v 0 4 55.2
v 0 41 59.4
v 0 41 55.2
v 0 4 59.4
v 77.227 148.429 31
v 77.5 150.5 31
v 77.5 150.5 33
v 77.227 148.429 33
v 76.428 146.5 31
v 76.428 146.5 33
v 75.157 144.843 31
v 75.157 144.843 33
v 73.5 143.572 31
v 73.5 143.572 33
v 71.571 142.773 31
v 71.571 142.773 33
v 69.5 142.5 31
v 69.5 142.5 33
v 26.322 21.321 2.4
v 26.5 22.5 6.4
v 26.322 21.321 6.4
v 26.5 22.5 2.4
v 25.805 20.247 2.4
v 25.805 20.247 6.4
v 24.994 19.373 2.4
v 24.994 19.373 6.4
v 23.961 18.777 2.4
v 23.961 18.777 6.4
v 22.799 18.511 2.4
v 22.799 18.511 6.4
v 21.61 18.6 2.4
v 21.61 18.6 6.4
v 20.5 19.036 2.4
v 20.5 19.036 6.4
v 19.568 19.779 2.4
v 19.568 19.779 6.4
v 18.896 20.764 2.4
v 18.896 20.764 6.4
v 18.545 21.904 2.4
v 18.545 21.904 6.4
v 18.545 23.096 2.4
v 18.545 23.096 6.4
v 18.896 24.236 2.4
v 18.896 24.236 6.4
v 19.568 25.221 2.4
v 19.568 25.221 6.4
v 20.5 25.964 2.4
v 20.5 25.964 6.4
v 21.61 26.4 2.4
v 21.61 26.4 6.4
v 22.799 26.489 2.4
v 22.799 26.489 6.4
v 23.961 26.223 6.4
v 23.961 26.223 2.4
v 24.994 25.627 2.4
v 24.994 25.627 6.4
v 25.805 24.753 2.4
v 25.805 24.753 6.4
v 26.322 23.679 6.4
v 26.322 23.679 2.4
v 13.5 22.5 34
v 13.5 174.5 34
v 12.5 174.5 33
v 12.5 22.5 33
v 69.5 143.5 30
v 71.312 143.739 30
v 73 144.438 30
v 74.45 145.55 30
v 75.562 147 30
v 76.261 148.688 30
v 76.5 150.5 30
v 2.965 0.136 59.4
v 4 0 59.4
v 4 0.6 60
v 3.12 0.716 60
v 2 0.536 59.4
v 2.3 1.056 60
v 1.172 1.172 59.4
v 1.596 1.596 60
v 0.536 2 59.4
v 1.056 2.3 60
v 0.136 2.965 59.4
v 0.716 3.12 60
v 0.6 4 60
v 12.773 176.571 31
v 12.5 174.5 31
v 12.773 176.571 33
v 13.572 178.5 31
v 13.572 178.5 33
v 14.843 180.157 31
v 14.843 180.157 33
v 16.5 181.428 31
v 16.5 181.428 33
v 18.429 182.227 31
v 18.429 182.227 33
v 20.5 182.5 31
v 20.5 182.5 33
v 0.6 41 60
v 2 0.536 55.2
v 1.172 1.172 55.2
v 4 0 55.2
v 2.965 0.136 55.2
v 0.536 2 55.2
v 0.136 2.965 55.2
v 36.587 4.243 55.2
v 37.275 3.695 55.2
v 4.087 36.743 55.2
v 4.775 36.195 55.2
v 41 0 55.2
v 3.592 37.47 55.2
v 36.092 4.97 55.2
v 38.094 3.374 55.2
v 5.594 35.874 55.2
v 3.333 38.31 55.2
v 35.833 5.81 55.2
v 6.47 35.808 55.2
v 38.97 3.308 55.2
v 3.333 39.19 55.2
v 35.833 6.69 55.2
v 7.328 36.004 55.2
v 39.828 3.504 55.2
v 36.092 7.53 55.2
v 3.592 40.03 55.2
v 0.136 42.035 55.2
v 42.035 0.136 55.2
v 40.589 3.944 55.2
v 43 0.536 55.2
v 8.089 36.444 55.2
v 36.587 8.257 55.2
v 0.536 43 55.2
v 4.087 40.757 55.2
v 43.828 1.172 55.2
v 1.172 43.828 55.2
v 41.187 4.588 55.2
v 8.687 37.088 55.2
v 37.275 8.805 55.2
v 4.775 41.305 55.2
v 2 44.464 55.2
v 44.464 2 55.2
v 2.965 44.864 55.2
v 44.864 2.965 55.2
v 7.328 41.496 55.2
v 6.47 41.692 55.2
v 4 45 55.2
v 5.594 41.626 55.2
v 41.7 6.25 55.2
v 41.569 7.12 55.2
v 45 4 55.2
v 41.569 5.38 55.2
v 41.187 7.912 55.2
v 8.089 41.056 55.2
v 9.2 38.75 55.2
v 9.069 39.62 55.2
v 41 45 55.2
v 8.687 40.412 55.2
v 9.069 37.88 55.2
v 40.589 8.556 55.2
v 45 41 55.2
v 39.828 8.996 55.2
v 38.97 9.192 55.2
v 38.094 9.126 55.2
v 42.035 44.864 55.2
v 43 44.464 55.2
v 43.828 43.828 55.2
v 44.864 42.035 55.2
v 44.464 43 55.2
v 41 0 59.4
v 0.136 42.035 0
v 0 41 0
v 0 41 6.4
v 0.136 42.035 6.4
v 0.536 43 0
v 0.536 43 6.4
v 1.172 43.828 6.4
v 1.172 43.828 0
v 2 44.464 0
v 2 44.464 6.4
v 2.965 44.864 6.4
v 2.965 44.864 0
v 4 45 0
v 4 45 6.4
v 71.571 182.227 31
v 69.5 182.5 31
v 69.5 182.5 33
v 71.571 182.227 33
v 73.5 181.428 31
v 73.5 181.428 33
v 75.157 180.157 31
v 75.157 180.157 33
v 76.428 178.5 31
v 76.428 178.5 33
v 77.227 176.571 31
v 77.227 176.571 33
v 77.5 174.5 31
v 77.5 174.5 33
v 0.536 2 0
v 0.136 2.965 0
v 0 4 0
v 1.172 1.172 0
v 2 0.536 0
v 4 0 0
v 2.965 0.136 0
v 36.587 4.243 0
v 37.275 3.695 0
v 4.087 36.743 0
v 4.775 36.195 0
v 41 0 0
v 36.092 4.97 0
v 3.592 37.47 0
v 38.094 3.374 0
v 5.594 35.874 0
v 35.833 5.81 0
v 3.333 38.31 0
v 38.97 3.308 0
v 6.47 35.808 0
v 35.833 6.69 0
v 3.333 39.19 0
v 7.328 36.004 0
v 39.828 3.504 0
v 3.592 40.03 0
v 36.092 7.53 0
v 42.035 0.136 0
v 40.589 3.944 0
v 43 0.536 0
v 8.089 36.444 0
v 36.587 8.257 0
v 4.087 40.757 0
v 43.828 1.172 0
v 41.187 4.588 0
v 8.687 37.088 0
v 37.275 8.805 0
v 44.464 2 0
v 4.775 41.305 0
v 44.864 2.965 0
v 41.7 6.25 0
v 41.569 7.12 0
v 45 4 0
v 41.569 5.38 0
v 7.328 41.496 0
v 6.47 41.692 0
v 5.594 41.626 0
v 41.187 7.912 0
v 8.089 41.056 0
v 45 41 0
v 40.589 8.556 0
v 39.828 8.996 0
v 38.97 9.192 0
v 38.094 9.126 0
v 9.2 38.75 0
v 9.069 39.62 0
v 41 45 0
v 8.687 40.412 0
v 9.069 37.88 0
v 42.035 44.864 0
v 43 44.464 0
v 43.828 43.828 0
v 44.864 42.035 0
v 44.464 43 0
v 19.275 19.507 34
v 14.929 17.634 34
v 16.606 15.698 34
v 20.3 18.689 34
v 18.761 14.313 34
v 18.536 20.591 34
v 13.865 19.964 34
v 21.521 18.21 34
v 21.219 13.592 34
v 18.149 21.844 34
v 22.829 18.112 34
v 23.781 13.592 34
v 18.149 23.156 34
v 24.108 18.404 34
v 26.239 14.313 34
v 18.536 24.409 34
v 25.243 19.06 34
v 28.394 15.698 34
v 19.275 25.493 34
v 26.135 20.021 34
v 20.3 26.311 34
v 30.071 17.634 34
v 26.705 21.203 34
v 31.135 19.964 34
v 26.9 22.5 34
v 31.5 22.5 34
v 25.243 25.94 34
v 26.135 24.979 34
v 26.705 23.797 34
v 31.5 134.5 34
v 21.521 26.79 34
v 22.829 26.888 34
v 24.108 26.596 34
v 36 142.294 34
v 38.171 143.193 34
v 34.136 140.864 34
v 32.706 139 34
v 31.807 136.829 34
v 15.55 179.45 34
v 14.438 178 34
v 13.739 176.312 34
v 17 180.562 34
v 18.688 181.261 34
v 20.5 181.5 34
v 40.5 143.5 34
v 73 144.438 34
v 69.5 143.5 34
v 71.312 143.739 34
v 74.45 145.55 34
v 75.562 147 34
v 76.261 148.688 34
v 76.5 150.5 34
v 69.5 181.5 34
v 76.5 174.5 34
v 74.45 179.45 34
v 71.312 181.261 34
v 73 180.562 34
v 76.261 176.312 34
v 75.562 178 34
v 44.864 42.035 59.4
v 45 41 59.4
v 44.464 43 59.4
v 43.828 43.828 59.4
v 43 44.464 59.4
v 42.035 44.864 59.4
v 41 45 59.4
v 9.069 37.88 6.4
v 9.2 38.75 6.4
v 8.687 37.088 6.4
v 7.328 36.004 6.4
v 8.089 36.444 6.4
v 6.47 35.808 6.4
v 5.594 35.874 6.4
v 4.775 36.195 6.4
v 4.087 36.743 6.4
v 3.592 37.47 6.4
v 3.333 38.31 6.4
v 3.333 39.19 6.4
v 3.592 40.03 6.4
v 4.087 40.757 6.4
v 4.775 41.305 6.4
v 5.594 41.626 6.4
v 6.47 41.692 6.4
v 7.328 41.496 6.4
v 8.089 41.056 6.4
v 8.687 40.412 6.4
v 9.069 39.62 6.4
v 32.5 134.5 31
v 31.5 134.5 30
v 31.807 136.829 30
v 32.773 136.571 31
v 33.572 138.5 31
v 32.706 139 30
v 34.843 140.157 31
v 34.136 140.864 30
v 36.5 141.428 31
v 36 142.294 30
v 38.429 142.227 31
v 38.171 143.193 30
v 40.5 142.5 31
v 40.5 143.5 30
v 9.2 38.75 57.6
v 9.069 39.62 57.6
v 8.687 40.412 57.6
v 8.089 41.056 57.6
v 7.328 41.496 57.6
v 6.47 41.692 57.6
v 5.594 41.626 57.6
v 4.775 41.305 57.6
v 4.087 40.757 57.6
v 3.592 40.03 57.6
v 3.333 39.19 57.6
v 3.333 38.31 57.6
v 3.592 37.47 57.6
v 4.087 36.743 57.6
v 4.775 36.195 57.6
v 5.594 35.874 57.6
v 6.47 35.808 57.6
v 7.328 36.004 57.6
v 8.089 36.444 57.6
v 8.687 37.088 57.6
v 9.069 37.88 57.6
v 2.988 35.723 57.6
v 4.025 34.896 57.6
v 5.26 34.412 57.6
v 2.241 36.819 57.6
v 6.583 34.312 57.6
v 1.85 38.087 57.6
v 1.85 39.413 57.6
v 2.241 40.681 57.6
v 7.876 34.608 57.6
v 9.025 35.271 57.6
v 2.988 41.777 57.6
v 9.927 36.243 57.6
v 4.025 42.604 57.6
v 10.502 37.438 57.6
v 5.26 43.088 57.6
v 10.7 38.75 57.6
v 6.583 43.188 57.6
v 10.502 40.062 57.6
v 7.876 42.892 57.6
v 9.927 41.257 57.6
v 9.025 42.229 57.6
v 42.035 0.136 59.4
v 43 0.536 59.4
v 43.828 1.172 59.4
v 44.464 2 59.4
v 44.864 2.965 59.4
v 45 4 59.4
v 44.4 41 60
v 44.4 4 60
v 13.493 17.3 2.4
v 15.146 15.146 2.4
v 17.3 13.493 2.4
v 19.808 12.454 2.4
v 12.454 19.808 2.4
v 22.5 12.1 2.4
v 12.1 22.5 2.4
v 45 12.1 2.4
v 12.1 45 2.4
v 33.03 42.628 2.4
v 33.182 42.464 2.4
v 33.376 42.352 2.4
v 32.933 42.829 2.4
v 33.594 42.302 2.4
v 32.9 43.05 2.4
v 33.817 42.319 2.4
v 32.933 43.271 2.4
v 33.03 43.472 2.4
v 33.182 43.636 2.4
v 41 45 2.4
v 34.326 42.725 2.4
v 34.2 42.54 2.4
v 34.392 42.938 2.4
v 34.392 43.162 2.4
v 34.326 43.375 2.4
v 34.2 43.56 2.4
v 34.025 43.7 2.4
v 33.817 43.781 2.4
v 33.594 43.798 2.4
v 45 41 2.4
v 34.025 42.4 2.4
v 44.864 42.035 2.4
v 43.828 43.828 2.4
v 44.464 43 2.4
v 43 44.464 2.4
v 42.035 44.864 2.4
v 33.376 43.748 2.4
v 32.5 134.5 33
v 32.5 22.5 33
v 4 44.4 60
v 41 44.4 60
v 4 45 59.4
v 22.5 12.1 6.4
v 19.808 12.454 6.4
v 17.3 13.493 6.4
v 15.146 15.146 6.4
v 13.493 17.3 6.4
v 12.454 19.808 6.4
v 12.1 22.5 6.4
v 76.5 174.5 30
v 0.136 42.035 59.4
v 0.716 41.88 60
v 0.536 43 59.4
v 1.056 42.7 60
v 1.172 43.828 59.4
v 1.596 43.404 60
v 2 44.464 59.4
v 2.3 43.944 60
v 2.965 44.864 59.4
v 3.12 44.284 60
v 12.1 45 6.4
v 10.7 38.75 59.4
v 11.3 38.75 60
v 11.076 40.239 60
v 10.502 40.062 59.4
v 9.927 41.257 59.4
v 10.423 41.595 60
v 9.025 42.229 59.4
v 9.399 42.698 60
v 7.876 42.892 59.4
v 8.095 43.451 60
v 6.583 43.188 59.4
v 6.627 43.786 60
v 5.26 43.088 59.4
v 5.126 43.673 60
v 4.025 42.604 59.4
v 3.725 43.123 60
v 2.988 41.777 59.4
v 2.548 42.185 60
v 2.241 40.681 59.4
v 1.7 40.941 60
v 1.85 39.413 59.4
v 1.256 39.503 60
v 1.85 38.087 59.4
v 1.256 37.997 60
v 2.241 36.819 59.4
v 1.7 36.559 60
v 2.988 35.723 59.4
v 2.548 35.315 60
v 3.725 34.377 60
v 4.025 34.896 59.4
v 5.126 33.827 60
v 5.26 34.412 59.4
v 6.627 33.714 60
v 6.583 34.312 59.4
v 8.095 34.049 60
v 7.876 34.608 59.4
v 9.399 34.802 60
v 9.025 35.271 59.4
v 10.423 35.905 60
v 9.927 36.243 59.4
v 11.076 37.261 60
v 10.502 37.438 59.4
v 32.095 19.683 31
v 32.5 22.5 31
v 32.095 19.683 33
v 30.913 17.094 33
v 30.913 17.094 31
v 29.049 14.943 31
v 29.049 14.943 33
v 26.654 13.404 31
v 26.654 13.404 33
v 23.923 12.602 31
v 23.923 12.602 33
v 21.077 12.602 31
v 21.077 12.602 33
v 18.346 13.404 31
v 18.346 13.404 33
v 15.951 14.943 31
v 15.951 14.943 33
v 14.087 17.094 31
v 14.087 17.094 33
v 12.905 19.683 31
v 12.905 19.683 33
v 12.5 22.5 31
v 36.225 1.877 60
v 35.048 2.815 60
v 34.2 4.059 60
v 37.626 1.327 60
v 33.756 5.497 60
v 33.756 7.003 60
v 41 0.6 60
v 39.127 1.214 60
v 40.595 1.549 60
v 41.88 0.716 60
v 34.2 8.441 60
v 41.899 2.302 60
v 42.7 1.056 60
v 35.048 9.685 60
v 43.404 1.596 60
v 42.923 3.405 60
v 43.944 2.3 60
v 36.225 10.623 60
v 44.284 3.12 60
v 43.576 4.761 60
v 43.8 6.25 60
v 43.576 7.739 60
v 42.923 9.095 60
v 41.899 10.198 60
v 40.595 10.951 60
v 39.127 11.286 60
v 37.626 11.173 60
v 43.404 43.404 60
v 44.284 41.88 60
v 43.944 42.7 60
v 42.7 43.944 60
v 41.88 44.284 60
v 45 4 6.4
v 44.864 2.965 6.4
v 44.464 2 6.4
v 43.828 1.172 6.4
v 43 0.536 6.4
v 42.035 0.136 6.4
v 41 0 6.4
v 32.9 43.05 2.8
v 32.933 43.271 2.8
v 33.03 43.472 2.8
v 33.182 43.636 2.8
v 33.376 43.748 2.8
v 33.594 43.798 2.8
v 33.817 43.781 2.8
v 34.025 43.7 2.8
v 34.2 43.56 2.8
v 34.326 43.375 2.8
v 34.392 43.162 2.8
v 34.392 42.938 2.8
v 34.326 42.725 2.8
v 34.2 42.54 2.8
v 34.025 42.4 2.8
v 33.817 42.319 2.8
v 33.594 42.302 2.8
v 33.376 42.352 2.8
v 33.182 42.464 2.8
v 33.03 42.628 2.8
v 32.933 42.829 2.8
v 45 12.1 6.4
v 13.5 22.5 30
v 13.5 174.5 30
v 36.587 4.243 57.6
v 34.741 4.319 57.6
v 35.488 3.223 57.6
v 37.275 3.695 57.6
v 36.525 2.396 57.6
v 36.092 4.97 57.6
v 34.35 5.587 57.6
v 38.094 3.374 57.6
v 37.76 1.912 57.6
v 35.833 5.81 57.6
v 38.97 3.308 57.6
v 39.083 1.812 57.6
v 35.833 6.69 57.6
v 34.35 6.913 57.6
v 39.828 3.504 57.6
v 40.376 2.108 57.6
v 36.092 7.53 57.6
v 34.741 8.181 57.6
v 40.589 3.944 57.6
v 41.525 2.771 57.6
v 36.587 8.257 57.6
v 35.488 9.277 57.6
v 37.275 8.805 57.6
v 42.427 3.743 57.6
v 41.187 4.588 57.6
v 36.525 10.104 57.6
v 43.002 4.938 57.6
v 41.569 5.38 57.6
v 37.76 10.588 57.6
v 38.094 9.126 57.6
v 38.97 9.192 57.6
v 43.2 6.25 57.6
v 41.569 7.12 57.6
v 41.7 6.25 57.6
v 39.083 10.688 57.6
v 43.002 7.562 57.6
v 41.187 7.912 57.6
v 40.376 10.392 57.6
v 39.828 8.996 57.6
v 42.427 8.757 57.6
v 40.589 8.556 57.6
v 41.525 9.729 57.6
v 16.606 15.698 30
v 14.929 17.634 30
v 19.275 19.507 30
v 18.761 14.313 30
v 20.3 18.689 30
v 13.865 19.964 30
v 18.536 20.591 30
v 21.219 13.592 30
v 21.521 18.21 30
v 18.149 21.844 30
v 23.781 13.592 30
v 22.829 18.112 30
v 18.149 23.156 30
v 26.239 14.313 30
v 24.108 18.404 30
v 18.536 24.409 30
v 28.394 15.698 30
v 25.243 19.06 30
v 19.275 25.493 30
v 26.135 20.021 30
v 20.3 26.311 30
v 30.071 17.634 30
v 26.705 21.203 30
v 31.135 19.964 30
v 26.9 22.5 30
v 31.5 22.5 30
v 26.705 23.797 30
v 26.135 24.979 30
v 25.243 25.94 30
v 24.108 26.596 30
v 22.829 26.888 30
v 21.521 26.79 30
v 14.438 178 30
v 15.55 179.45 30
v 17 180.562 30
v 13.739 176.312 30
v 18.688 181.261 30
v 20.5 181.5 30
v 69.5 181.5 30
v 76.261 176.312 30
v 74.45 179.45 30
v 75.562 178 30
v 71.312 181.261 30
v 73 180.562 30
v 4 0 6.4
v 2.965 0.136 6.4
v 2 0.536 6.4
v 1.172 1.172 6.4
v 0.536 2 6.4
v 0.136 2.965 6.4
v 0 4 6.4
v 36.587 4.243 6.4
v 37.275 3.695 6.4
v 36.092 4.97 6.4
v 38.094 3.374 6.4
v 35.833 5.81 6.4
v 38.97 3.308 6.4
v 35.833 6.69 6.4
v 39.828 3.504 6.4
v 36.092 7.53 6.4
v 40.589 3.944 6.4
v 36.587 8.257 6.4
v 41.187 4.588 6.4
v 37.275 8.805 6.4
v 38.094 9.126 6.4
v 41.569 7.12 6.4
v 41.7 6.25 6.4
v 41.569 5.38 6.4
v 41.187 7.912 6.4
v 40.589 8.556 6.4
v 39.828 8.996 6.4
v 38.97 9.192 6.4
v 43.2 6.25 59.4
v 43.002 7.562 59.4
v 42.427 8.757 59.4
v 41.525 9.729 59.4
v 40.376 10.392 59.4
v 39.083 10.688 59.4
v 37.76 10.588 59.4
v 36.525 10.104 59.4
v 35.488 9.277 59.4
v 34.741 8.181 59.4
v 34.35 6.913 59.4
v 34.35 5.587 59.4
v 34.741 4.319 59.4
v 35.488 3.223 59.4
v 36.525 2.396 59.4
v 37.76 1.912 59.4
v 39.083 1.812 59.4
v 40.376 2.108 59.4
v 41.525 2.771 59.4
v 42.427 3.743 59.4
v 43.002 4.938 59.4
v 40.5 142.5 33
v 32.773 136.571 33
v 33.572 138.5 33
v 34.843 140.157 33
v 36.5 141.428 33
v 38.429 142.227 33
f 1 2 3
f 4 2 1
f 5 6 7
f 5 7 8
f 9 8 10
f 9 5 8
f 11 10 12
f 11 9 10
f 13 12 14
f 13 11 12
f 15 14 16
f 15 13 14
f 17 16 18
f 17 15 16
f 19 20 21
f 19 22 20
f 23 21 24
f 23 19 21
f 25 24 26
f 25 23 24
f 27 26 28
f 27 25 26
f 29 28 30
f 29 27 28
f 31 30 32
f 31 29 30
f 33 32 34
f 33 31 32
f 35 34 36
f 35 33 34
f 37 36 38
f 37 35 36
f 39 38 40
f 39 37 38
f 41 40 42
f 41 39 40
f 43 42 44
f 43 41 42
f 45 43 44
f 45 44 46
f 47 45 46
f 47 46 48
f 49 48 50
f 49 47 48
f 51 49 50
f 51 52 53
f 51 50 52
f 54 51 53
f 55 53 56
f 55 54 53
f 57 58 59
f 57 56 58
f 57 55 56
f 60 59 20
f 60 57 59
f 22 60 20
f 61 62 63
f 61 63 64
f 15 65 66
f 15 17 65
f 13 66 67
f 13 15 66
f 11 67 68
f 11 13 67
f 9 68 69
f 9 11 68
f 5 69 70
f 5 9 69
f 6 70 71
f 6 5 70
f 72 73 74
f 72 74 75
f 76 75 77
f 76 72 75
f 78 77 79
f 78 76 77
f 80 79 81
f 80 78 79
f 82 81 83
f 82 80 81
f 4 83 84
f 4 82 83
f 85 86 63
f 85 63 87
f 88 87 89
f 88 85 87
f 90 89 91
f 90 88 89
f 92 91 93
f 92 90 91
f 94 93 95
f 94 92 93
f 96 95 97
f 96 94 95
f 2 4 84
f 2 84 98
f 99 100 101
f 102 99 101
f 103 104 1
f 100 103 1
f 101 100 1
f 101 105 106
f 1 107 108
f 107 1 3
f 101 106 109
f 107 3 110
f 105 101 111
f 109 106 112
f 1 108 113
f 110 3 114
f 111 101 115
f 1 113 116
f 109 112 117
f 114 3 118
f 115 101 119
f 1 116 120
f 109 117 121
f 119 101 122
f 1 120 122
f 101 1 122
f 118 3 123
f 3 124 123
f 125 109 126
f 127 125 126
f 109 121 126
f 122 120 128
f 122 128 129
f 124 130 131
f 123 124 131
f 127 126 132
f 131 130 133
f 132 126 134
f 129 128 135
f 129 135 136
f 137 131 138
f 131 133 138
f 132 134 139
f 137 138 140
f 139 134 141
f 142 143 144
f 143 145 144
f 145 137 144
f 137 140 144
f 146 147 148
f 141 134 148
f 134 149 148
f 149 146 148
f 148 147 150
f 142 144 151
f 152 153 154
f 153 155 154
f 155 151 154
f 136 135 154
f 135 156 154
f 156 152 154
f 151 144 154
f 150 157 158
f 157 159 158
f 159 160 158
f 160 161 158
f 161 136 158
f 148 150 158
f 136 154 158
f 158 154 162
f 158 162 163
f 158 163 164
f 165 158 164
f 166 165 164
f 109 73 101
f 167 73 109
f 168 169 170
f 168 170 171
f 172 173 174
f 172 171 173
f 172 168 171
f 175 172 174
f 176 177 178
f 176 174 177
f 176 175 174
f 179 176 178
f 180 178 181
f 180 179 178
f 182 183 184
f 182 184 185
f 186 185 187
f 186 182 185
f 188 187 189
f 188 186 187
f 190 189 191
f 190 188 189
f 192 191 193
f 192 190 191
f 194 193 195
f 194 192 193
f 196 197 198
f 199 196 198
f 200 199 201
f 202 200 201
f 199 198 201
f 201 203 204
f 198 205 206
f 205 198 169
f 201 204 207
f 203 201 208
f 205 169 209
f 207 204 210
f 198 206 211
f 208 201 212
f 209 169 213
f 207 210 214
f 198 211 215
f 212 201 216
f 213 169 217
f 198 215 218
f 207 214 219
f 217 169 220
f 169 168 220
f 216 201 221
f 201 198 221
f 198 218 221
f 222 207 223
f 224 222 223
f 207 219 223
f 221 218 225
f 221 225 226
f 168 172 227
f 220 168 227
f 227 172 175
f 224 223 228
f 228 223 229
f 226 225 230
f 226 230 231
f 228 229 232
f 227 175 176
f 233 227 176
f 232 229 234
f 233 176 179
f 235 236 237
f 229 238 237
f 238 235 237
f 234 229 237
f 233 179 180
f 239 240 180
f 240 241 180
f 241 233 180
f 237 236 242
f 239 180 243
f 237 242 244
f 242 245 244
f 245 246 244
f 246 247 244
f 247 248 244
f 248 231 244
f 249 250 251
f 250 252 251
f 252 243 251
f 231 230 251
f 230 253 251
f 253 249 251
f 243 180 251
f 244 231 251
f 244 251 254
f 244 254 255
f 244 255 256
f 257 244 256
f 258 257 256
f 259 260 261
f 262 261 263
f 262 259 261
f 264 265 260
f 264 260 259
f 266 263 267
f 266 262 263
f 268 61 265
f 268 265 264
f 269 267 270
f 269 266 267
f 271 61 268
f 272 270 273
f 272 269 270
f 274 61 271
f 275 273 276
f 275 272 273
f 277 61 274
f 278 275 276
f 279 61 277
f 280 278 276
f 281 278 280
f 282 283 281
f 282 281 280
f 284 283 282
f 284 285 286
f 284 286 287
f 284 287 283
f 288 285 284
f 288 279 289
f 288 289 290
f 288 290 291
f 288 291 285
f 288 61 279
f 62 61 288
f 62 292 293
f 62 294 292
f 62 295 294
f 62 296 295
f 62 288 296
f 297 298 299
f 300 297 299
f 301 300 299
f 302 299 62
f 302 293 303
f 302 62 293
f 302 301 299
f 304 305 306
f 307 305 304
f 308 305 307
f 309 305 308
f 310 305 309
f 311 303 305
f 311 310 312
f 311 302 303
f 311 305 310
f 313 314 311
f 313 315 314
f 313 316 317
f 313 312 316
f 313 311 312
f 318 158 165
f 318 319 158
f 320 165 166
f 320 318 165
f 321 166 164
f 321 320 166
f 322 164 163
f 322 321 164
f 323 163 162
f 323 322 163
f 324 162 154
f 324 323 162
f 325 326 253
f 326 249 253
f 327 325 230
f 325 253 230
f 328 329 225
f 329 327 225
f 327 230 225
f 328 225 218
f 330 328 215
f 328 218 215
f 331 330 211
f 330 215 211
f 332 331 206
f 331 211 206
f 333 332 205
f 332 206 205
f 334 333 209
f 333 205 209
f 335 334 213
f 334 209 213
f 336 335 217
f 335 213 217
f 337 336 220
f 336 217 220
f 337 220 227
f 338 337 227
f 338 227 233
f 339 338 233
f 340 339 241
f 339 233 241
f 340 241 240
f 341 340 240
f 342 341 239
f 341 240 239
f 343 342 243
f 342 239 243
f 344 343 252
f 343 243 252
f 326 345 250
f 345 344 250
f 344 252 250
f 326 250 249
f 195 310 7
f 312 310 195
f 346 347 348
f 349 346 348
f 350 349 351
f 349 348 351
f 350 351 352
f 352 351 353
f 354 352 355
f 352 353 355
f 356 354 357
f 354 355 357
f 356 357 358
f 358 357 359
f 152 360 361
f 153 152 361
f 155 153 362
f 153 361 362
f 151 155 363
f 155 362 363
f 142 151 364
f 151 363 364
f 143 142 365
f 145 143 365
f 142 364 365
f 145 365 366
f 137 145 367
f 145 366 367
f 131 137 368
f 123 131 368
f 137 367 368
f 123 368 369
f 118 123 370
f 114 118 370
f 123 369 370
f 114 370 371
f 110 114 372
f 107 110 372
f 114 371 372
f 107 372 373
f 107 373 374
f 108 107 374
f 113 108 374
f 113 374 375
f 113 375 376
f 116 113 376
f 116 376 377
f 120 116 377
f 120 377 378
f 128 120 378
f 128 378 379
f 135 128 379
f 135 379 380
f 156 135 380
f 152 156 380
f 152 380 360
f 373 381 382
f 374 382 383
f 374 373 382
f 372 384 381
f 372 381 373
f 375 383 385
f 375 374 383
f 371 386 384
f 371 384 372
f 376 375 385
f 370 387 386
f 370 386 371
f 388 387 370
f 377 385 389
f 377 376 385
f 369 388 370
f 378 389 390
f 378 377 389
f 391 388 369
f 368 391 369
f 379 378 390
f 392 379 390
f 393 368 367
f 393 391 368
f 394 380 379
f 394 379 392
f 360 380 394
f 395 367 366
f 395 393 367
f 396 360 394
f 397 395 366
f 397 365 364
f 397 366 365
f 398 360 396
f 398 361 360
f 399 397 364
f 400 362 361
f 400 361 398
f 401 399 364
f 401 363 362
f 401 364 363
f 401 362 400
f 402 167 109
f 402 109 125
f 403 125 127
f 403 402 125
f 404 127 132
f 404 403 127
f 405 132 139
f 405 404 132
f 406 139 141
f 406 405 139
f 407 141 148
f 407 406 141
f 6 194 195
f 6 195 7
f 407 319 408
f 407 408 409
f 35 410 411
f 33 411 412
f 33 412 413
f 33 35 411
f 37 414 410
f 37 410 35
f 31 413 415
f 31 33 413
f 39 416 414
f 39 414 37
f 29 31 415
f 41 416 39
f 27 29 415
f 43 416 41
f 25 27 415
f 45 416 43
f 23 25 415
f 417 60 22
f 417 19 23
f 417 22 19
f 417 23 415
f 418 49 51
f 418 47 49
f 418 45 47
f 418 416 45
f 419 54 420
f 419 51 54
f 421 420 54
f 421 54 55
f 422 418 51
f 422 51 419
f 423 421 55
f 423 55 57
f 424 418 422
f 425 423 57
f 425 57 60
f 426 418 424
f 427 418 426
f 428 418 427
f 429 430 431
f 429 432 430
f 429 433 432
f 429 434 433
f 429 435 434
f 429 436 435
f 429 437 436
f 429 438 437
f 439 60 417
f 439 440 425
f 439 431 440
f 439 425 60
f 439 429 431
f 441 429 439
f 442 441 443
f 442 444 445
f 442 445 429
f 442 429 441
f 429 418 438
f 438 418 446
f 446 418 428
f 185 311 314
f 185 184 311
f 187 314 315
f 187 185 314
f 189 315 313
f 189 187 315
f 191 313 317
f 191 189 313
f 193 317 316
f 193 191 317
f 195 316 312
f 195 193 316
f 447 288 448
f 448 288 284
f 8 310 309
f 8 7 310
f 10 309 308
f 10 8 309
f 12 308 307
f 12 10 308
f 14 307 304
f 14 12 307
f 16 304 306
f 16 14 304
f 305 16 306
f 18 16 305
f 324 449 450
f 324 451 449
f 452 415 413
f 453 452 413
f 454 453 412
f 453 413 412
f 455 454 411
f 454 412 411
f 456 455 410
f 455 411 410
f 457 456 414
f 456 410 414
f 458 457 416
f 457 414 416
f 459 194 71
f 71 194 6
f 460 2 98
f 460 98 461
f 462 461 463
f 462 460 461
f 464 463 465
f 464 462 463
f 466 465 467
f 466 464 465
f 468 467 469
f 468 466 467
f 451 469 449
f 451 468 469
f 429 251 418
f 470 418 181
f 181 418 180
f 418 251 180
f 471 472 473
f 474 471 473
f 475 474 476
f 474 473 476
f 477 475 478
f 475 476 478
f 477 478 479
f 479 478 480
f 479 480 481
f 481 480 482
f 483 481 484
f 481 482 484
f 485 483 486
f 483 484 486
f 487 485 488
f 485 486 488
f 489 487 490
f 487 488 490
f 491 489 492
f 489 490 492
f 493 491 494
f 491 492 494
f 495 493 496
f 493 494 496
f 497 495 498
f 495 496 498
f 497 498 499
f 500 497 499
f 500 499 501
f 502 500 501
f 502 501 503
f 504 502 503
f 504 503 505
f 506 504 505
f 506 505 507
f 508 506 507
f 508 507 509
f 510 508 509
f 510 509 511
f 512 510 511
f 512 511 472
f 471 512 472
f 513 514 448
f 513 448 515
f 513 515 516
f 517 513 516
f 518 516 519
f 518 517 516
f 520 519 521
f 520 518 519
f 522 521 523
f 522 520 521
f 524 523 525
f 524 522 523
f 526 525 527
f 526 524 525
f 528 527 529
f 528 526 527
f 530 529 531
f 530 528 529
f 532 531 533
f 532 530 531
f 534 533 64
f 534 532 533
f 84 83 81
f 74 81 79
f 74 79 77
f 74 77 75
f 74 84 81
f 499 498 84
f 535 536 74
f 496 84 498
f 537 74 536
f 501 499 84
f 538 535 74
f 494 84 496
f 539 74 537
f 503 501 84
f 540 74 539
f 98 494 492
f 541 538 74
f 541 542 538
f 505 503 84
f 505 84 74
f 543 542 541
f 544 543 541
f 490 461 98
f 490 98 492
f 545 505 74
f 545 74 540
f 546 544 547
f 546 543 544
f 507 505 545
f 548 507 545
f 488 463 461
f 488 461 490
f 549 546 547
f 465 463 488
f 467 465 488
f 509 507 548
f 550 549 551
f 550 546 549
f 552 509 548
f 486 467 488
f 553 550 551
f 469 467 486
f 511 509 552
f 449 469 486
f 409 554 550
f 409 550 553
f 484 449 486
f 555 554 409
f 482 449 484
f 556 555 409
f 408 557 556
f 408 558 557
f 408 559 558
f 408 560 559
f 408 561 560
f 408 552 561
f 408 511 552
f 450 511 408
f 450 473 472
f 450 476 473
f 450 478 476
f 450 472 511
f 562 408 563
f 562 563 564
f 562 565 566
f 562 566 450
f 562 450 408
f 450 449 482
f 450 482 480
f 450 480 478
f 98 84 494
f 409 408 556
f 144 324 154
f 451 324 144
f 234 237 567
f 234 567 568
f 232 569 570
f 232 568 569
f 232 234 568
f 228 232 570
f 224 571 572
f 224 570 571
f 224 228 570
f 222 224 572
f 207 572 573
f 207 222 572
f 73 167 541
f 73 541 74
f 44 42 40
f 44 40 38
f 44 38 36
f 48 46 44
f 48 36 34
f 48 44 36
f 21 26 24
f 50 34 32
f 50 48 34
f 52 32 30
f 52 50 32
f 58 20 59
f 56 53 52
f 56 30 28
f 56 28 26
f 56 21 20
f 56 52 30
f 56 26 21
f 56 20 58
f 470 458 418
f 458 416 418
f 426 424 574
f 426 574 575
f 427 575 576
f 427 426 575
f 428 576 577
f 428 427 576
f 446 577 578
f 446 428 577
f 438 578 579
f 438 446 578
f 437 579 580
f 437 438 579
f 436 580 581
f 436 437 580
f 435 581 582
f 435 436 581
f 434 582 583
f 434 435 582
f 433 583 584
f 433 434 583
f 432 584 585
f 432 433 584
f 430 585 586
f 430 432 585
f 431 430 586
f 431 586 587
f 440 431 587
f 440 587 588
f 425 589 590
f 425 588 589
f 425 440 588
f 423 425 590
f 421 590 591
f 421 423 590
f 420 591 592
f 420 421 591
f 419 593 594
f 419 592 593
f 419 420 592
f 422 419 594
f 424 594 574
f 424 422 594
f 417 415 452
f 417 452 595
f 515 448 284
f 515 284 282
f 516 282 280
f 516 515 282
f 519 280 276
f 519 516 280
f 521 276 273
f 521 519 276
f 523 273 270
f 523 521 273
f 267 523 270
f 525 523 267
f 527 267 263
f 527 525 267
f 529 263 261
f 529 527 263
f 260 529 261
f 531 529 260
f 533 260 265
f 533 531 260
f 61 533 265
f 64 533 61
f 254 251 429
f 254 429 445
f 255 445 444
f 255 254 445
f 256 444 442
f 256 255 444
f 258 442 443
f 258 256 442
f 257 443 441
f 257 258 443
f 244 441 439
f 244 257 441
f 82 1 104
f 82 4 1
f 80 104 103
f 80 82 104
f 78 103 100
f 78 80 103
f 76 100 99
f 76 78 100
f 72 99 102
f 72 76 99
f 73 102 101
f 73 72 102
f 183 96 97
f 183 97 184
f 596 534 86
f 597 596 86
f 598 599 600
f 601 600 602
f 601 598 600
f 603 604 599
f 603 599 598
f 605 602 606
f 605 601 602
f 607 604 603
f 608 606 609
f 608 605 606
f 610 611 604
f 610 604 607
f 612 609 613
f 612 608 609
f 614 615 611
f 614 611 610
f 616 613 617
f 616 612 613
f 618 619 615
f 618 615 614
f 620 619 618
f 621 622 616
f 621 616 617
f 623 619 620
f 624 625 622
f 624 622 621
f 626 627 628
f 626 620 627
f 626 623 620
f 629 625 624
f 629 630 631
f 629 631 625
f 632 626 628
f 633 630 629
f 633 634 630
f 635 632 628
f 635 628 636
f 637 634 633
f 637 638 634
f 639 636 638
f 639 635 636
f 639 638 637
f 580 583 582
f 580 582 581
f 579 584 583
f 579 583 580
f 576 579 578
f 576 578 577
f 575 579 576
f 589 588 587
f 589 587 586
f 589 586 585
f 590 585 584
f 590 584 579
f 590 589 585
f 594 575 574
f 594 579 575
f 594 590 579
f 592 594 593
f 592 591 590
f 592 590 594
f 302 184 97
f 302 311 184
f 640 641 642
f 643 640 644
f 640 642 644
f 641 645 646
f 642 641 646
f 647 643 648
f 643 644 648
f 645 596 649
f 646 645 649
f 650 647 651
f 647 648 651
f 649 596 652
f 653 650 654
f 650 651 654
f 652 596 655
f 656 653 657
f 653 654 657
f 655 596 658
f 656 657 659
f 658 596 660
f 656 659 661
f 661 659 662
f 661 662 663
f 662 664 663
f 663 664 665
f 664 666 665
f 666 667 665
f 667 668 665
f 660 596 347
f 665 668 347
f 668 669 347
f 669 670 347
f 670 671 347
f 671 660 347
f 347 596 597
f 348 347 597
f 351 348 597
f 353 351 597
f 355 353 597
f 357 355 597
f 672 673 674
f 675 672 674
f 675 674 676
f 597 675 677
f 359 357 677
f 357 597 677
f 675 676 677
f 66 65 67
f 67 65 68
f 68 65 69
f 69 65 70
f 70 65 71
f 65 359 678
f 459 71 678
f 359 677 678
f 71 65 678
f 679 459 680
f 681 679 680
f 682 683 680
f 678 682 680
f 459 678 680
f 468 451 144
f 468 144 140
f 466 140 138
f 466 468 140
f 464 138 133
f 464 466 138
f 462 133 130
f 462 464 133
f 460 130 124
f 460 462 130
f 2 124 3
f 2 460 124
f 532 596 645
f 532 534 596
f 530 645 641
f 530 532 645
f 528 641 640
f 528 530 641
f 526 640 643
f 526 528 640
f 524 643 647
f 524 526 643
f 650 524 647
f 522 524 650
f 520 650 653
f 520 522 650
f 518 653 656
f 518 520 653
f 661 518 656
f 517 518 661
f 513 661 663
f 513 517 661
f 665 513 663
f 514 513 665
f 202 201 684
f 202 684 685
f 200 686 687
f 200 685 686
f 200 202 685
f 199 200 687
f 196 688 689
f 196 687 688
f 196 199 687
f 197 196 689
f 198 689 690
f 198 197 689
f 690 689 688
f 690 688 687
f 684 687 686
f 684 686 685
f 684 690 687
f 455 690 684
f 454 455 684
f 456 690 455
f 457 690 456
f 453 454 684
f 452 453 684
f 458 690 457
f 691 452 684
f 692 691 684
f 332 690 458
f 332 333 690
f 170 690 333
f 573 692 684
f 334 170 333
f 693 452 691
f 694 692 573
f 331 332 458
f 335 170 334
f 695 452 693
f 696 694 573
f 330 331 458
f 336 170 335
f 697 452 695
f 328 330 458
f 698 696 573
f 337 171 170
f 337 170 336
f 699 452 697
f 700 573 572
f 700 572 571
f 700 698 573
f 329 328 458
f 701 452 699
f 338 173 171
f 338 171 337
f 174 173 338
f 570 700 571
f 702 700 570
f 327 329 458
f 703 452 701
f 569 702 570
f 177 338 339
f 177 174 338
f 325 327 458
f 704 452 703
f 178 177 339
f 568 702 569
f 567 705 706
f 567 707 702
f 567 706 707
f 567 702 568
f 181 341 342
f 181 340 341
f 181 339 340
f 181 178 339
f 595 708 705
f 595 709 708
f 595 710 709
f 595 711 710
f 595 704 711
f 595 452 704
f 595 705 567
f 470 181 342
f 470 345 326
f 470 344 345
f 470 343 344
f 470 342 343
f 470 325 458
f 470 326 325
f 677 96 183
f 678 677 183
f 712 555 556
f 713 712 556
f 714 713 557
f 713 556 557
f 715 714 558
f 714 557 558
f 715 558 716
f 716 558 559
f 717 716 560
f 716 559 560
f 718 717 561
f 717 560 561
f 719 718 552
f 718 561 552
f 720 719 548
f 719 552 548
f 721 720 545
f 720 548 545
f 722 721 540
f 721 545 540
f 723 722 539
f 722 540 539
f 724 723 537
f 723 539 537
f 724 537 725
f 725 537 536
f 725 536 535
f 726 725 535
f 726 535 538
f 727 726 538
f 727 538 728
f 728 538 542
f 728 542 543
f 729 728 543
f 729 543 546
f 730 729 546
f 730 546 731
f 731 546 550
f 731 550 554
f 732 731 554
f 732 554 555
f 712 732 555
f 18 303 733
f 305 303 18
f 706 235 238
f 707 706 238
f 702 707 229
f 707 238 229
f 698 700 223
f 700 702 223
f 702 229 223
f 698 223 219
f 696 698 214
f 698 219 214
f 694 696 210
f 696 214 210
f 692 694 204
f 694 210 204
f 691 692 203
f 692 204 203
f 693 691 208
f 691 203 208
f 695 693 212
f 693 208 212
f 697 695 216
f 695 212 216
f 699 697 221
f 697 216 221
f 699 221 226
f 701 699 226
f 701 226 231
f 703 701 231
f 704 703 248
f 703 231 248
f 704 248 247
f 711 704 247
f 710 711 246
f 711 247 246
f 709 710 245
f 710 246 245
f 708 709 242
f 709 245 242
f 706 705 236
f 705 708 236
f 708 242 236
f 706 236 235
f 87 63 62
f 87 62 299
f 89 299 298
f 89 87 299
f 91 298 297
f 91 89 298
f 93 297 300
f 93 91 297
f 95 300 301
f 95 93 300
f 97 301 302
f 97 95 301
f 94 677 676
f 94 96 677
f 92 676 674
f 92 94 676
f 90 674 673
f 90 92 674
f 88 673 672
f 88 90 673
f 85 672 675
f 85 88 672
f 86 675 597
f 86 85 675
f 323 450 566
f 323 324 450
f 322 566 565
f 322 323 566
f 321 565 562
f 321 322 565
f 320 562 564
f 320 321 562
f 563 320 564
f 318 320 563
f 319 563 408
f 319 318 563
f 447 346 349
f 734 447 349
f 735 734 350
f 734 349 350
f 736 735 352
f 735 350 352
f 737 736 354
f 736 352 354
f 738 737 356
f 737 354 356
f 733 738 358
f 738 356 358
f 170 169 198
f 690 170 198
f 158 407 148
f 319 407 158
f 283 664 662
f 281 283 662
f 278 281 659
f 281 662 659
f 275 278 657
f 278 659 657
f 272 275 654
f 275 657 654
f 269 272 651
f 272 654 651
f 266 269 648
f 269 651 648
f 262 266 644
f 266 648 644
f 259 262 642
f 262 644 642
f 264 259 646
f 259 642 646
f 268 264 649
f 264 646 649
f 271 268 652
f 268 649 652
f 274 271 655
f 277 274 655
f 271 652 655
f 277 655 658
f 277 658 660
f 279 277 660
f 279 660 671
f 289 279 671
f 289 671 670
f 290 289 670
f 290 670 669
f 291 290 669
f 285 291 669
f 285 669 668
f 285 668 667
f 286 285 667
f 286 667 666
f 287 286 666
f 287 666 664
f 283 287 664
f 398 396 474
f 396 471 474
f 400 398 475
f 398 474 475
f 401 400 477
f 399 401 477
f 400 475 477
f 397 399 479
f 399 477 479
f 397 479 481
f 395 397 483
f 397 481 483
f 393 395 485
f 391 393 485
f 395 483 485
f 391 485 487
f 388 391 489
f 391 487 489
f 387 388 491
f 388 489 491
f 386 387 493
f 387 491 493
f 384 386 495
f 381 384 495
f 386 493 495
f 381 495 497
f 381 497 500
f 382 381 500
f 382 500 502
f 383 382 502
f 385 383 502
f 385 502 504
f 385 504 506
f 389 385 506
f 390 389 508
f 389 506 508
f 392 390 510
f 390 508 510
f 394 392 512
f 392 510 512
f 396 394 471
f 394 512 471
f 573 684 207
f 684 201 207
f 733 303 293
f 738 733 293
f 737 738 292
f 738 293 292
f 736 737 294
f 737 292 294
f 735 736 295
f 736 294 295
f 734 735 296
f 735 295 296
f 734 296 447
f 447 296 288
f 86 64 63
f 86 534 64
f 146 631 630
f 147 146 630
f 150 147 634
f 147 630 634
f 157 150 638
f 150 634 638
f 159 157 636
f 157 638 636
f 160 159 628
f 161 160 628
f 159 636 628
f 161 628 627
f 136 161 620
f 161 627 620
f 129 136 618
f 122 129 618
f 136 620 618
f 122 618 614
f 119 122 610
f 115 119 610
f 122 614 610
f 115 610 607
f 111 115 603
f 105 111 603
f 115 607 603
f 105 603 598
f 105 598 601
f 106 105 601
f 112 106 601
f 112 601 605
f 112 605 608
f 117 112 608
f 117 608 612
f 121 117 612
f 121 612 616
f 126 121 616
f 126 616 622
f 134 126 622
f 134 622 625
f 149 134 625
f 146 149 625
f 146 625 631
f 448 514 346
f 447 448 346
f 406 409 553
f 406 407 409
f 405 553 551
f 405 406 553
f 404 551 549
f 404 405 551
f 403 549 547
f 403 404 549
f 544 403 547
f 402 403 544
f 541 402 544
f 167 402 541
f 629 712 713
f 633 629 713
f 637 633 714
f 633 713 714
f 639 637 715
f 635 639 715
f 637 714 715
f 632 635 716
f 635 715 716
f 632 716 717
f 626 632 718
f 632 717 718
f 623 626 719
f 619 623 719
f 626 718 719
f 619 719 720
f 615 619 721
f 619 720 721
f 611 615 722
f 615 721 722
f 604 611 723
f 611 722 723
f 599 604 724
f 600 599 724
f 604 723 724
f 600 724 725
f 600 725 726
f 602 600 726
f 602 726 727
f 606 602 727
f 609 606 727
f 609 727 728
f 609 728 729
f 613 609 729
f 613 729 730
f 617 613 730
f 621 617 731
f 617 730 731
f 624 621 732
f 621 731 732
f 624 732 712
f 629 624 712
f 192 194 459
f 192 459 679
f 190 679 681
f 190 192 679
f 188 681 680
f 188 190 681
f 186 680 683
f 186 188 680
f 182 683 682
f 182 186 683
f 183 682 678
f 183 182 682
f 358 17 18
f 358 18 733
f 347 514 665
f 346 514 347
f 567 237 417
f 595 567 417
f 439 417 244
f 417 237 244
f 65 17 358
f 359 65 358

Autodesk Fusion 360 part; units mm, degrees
sketch "Sketch1" plane through (0, 0, 0) normal (0, 0, 1) x (1, 0, 0) in component "Component"
  line L0 (0, 0) -> (45, 0) construction
  line L1 (45, 0) -> (45, 45) construction
  line L2 (45, 45) -> (0, 45) construction
  line L3 (0, 45) -> (0, 0) construction
  line L4 (0, 45) -> (45, 0) construction
  line L5 (0, 0) -> (45, 45) construction
  circle A0 centre (22.5, 22.5) radius 10
  line L6 (12.5, 22.5) -> (12.5, 45)
  line L7 (22.5, 12.5) -> (45, 12.5)
  circle A1 centre (22.5, 22.5) radius 4
  line L8 (32.5, 22.5) -> (32.5, 45) construction
  line L9 (12.5, 45) -> (0, 32.5) construction
  line L10 (45, 12.5) -> (32.5, 0) construction
  circle A2 centre (6.25, 38.75) radius 2.95
  circle A3 centre (6.25, 38.75) radius 4.45
  circle A4 centre (38.75, 6.25) radius 2.95
  circle A5 centre (38.75, 6.25) radius 4.45
  line L11 (0, 41) -> (0, 4)
  line L12 (4, 0) -> (41, 0)
  line L13 (45, 4) -> (45, 41)
  line L14 (41, 45) -> (4, 45)
  arc A6 (4, 45) -> (0, 41) centre (4, 41) ccw
  arc A7 (45, 41) -> (41, 45) centre (41, 41) ccw
  arc A8 (41, 0) -> (45, 4) centre (41, 4) ccw
  arc A9 (0, 4) -> (4, 0) centre (4, 4) ccw
  circle A10 centre (22.5, 22.5) radius 4.4
  line L15 (12.1, 22.5) -> (12.1, 45)
  circle A11 centre (22.5, 22.5) radius 10.4
  line L16 (22.5, 12.1) -> (45, 12.1)
  dimension "d1" = 45
  dimension "d2" = 45
  dimension "d5" = 20
  dimension "d6" = 8
  dimension "d24" = 5.9
  dimension "d25" = 8.9
  dimension "d26" = 5.9
  dimension "d27" = 8.9
  dimension "d30" = 4
  dimension "d31" = 4
  dimension "d32" = 4
  dimension "d33" = 4
  dimension "d69" = 0.4
  dimension "d70" = 0.4
  dimension "d71" = 0.4
  dimension "d72" = 0.4
extrude "Extrude5" add sketch "Sketch1" along normal blind 2.4 contours A0 | A0 L6 L7 A11 | A0 L6 L7 A11 | L6 L14 L15 A11 | L6 L7 L13 L14 A7 A11 | L7 L13 A11 L16 | A10 makes body 1 in component "Component"
extrude "Extrude7" add sketch "Sketch1" along normal blind 6.4 contours L11 L12 L13 L14 A6 A8 A9 L15 A11 L16 | A1 | A3 | A5 bodies 1 in component "Component"
ref_plane "WorkPlane2" through (0, 0, 60) normal (0, 0, 1) x (1, 0, 0) in component "Component"
sketch "Sketch3" plane through (0, 0, 60) normal (0, 0, 1) x (1, 0, 0) in component "Component"
  line L0 (4, 0) -> (41, 0)
  arc A0 (41, 0) -> (45, 4) centre (41, 4) ccw
  line L1 (45, 4) -> (45, 41)
  arc A1 (45, 41) -> (41, 45) centre (41, 41) ccw
  line L2 (41, 45) -> (4, 45)
  arc A2 (4, 45) -> (0, 41) centre (4, 41) ccw
  line L3 (0, 41) -> (0, 4)
  arc A3 (0, 4) -> (4, 0) centre (4, 4) ccw
  circle A4 centre (6.25, 38.75) radius 4.45
  circle A5 centre (6.25, 38.75) radius 2.95
  circle A6 centre (22.5, 22.5) radius 4
  circle A7 centre (38.75, 6.25) radius 4.45
  circle A8 centre (38.75, 6.25) radius 2.95
  circle A9 centre (22.5, 22.5) radius 4.4
extrude "Extrude8" add sketch "Sketch3" against normal blind 2.4 separate body contours L0 A0 L1 A1 L2 A2 L3 A3 | A4 | A6 | A7 | A9 makes body 2 in component "Component"
extrude "Extrude9" add sketch "Sketch3" against normal blind 4.8 contours L0 A0 L1 A1 L2 A2 L3 A3 | A4 | A6 | A7 | A9 bodies 2 in component "Component"
extrude "Extrude10" cut sketch "Sketch3" against normal blind 2.4 contours A4 | A7 bodies 2 in component "Component"
ref_plane "WorkPlane3" through (0, 0, 30) normal (0, 0, 1) x (1, 0, 0) in component "Component"
sketch "Sketch4" plane through (0, 0, 30) normal (0, 0, 1) x (1, 0, 0) in component "Component"
  circle A0 centre (22.5, 22.5) radius 10
  circle A1 centre (22.5, 22.5) radius 4
  line L0 (0, 0) -> (45, 45)
  line L1 (45, 45) -> (0, 45)
  line L2 (12.5, 12.5) -> (12.5, 182.5) construction
  line L3 (0, 45) -> (45, 0)
  line L4 (22.5, 12.5) -> (45, 12.5)
  line L5 (32.5, 22.5) -> (32.5, 45)
  line L6 (32.5, 12.5) -> (32.5, 142.5) construction
  line L7 (12.5, 182.5) -> (77.5, 182.5) construction
  line L8 (12.5, 22.5) -> (12.5, 45)
  line L9 (77.5, 182.5) -> (77.5, 142.5) construction
  line L10 (77.5, 142.5) -> (32.5, 142.5) construction
  line L11 (12.5, 12.5) -> (12.5, 174.5)
  line L12 (20.5, 182.5) -> (69.5, 182.5)
  line L13 (77.5, 174.5) -> (77.5, 150.5)
  line L14 (69.5, 142.5) -> (40.5, 142.5)
  line L15 (32.5, 134.5) -> (32.5, 12.5)
  arc A2 (20.5, 182.5) -> (12.5, 174.5) centre (20.5, 174.5) ccw
  arc A3 (77.5, 174.5) -> (69.5, 182.5) centre (69.5, 174.5) ccw
  arc A4 (69.5, 142.5) -> (77.5, 150.5) centre (69.5, 150.5) ccw
  arc A5 (40.5, 142.5) -> (32.5, 134.5) centre (40.5, 134.5) ccw
  circle A6 centre (22.5, 22.5) radius 4.4
  dimension "d48" = 170
  dimension "d49" = 130
  dimension "d50" = 65
  dimension "d51" = 40
  dimension "d52" = 8
  dimension "d53" = 8
  dimension "d54" = 8
  dimension "d55" = 8
extrude "Extrude11" add sketch "Sketch4" along normal blind 4 separate body contours A0 L0 L3 A6 | A0 L0 L5 L15 | A0 L0 L3 A6 | A0 L0 L1 L3 L5 L8 L11 L15 | A0 L0 L3 A6 | A0 L0 L3 A6 | A0 L3 L8 L11 | L1 L11 L12 L13 L14 L15 A2 A3 A4 A5 makes body 3 in component "Component"
sketch "Sketch5" plane through (0, 0, 2.4) normal (0, 0, 1) x (-1, 0, 0) in component "Component"
  line L0 (-45, -12.1) -> (-45, -41)
  arc A0 (-45, -41) -> (-41, -45) centre (-41, -41) ccw
  line L1 (-41, -45) -> (-12.1, -45)
  line L2 (-32.5, -22.5) -> (-32.5, -45)
  line L3 (-45, -45) -> (0, -45)
  line L4 (-32.5, -22.5) -> (-32.5, -134.5)
  line L5 (-41, -45) -> (-4, -45)
  arc A1 (-12.1, -22.5) -> (-22.5, -12.1) centre (-22.5, -22.5) ccw
  line L6 (-22.5, -12.1) -> (-45, -12.1)
  line L7 (-12.1, -45) -> (-12.1, -22.5)
  circle A2 centre (-22.5, -22.5) radius 4
  line L8 (-32.5, -45) -> (-32.9, -45) construction
  line L9 (-32.9, -45) -> (-32.9, -43.8) construction
  line L10 (-32.9, -43.8) -> (-32.5, -43.8) construction
  line L11 (-32.5, -43.8) -> (-32.5, -45) construction
  line L12 (-32.9, -43.8) -> (-34.4, -43.8) construction
  line L13 (-34.4, -43.8) -> (-34.4, -42.6) construction
  line L14 (-34.4, -42.6) -> (-32.9, -42.6) construction
  line L15 (-32.9, -42.6) -> (-32.9, -43.8) construction
  circle A3 centre (-33.65, -43.05) radius 0.75
  dimension "d75" = 0.4
  dimension "d76" = 1.2
  dimension "d77" = 1.5
  dimension "d78" = 1.2
  dimension "d79" = 0.75
chamfer "Chamfer1" distance 0.6 angle 45 2 edges at (2.1011, 40.3592, 60) (34.6011, 7.8592, 60) on bodies 2 in component "Component"
chamfer "Chamfer2" distance 0.6 angle 45 8 edges at (1.1716, 1.1716, 60) (22.5, 0, 60) (43.8284, 1.1716, 60) (45, 22.5, 60) (43.8284, 43.8284, 60) (22.5, 45, 60) (1.1716, 43.8284, 60) (0, 22.5, 60) on bodies 2 in component "Component"
chamfer "Chamfer3" distance 1 angle 45 20 edges at (32.5, 78.5, 34) (34.8431, 140.1569, 34) (55, 142.5, 34) (75.1569, 144.8431, 34) (77.5, 162.5, 34) (75.1569, 180.1569, 34) (45, 182.5, 34) (14.8431, 180.1569, 34) (12.5, 98.5, 34) (22.5, 12.5, 34) (14.8431, 180.1569, 30) (45, 182.5, 30) (75.1569, 180.1569, 30) (77.5, 162.5, 30) (75.1569, 144.8431, 30) (55, 142.5, 30) (34.8431, 140.1569, 30) (32.5, 78.5, 30) (22.5, 12.5, 30) (12.5, 98.5, 30) on bodies 3 in component "Component"
extrude "Extrude13" add sketch "Sketch5" along normal blind 0.4 contours A3 bodies 1 in component "Component"
component "Component" placed x (1, 0, 0) y (0, 1, 0) z (0, 0, 1) at (0, 0, 0)
equation "d1 = BaseSize"
equation "d2 = BaseSize"
equation "HoleDiameter = 8 mm"
equation "ArmWidth = 20 mm"
equation "d5 = ArmWidth"
equation "d6 = HoleDiameter"
equation "PlateThickness = 2.4 mm"
equation "ArmThickness = 4 mm"
equation "PrintingTolerance = 0.2 mm"
equation "ArmLength = 170 mm"
equation "FlagHeight = 40 mm"
equation "FlagWidth = 65 mm"
equation "ScrewDiameter = 5.5 mm"
equation "ScrewHeadDiameter = 8.5 mm"
equation "BaseSize = 45 mm"
equation "d24 = ScrewDiameter + PrintingTolerance * 2"
equation "d25 = ScrewHeadDiameter + PrintingTolerance * 2"
equation "d26 = ScrewDiameter + PrintingTolerance * 2"
equation "d27 = ScrewHeadDiameter + PrintingTolerance * 2"
equation "d30 = MountFilletRadius"
equation "d31 = MountFilletRadius"
equation "d32 = MountFilletRadius"
equation "d33 = MountFilletRadius"
equation "d34 = PlateThickness"
equation "d38 = PlateThickness + ArmThickness"
equation "d41 = -PlateThickness"
equation "d43 = -( PlateThickness * 2 )"
equation "d45 = -PlateThickness"
equation "d48 = ArmLength"
equation "d49 = ArmLength - FlagHeight"
equation "d50 = FlagWidth"
equation "d51 = FlagHeight"
equation "d56 = ArmThickness"
equation "NubThickness = 0.4 mm"
equation "d69 = PrintingTolerance * 2"
equation "d70 = PrintingTolerance * 2"
equation "d71 = PrintingTolerance * 2"
equation "d72 = PrintingTolerance * 2"
equation "d75 = PrintingTolerance * 2"
equation "d79 = d77 / 2"
equation "MountFilletRadius = 4 mm"
